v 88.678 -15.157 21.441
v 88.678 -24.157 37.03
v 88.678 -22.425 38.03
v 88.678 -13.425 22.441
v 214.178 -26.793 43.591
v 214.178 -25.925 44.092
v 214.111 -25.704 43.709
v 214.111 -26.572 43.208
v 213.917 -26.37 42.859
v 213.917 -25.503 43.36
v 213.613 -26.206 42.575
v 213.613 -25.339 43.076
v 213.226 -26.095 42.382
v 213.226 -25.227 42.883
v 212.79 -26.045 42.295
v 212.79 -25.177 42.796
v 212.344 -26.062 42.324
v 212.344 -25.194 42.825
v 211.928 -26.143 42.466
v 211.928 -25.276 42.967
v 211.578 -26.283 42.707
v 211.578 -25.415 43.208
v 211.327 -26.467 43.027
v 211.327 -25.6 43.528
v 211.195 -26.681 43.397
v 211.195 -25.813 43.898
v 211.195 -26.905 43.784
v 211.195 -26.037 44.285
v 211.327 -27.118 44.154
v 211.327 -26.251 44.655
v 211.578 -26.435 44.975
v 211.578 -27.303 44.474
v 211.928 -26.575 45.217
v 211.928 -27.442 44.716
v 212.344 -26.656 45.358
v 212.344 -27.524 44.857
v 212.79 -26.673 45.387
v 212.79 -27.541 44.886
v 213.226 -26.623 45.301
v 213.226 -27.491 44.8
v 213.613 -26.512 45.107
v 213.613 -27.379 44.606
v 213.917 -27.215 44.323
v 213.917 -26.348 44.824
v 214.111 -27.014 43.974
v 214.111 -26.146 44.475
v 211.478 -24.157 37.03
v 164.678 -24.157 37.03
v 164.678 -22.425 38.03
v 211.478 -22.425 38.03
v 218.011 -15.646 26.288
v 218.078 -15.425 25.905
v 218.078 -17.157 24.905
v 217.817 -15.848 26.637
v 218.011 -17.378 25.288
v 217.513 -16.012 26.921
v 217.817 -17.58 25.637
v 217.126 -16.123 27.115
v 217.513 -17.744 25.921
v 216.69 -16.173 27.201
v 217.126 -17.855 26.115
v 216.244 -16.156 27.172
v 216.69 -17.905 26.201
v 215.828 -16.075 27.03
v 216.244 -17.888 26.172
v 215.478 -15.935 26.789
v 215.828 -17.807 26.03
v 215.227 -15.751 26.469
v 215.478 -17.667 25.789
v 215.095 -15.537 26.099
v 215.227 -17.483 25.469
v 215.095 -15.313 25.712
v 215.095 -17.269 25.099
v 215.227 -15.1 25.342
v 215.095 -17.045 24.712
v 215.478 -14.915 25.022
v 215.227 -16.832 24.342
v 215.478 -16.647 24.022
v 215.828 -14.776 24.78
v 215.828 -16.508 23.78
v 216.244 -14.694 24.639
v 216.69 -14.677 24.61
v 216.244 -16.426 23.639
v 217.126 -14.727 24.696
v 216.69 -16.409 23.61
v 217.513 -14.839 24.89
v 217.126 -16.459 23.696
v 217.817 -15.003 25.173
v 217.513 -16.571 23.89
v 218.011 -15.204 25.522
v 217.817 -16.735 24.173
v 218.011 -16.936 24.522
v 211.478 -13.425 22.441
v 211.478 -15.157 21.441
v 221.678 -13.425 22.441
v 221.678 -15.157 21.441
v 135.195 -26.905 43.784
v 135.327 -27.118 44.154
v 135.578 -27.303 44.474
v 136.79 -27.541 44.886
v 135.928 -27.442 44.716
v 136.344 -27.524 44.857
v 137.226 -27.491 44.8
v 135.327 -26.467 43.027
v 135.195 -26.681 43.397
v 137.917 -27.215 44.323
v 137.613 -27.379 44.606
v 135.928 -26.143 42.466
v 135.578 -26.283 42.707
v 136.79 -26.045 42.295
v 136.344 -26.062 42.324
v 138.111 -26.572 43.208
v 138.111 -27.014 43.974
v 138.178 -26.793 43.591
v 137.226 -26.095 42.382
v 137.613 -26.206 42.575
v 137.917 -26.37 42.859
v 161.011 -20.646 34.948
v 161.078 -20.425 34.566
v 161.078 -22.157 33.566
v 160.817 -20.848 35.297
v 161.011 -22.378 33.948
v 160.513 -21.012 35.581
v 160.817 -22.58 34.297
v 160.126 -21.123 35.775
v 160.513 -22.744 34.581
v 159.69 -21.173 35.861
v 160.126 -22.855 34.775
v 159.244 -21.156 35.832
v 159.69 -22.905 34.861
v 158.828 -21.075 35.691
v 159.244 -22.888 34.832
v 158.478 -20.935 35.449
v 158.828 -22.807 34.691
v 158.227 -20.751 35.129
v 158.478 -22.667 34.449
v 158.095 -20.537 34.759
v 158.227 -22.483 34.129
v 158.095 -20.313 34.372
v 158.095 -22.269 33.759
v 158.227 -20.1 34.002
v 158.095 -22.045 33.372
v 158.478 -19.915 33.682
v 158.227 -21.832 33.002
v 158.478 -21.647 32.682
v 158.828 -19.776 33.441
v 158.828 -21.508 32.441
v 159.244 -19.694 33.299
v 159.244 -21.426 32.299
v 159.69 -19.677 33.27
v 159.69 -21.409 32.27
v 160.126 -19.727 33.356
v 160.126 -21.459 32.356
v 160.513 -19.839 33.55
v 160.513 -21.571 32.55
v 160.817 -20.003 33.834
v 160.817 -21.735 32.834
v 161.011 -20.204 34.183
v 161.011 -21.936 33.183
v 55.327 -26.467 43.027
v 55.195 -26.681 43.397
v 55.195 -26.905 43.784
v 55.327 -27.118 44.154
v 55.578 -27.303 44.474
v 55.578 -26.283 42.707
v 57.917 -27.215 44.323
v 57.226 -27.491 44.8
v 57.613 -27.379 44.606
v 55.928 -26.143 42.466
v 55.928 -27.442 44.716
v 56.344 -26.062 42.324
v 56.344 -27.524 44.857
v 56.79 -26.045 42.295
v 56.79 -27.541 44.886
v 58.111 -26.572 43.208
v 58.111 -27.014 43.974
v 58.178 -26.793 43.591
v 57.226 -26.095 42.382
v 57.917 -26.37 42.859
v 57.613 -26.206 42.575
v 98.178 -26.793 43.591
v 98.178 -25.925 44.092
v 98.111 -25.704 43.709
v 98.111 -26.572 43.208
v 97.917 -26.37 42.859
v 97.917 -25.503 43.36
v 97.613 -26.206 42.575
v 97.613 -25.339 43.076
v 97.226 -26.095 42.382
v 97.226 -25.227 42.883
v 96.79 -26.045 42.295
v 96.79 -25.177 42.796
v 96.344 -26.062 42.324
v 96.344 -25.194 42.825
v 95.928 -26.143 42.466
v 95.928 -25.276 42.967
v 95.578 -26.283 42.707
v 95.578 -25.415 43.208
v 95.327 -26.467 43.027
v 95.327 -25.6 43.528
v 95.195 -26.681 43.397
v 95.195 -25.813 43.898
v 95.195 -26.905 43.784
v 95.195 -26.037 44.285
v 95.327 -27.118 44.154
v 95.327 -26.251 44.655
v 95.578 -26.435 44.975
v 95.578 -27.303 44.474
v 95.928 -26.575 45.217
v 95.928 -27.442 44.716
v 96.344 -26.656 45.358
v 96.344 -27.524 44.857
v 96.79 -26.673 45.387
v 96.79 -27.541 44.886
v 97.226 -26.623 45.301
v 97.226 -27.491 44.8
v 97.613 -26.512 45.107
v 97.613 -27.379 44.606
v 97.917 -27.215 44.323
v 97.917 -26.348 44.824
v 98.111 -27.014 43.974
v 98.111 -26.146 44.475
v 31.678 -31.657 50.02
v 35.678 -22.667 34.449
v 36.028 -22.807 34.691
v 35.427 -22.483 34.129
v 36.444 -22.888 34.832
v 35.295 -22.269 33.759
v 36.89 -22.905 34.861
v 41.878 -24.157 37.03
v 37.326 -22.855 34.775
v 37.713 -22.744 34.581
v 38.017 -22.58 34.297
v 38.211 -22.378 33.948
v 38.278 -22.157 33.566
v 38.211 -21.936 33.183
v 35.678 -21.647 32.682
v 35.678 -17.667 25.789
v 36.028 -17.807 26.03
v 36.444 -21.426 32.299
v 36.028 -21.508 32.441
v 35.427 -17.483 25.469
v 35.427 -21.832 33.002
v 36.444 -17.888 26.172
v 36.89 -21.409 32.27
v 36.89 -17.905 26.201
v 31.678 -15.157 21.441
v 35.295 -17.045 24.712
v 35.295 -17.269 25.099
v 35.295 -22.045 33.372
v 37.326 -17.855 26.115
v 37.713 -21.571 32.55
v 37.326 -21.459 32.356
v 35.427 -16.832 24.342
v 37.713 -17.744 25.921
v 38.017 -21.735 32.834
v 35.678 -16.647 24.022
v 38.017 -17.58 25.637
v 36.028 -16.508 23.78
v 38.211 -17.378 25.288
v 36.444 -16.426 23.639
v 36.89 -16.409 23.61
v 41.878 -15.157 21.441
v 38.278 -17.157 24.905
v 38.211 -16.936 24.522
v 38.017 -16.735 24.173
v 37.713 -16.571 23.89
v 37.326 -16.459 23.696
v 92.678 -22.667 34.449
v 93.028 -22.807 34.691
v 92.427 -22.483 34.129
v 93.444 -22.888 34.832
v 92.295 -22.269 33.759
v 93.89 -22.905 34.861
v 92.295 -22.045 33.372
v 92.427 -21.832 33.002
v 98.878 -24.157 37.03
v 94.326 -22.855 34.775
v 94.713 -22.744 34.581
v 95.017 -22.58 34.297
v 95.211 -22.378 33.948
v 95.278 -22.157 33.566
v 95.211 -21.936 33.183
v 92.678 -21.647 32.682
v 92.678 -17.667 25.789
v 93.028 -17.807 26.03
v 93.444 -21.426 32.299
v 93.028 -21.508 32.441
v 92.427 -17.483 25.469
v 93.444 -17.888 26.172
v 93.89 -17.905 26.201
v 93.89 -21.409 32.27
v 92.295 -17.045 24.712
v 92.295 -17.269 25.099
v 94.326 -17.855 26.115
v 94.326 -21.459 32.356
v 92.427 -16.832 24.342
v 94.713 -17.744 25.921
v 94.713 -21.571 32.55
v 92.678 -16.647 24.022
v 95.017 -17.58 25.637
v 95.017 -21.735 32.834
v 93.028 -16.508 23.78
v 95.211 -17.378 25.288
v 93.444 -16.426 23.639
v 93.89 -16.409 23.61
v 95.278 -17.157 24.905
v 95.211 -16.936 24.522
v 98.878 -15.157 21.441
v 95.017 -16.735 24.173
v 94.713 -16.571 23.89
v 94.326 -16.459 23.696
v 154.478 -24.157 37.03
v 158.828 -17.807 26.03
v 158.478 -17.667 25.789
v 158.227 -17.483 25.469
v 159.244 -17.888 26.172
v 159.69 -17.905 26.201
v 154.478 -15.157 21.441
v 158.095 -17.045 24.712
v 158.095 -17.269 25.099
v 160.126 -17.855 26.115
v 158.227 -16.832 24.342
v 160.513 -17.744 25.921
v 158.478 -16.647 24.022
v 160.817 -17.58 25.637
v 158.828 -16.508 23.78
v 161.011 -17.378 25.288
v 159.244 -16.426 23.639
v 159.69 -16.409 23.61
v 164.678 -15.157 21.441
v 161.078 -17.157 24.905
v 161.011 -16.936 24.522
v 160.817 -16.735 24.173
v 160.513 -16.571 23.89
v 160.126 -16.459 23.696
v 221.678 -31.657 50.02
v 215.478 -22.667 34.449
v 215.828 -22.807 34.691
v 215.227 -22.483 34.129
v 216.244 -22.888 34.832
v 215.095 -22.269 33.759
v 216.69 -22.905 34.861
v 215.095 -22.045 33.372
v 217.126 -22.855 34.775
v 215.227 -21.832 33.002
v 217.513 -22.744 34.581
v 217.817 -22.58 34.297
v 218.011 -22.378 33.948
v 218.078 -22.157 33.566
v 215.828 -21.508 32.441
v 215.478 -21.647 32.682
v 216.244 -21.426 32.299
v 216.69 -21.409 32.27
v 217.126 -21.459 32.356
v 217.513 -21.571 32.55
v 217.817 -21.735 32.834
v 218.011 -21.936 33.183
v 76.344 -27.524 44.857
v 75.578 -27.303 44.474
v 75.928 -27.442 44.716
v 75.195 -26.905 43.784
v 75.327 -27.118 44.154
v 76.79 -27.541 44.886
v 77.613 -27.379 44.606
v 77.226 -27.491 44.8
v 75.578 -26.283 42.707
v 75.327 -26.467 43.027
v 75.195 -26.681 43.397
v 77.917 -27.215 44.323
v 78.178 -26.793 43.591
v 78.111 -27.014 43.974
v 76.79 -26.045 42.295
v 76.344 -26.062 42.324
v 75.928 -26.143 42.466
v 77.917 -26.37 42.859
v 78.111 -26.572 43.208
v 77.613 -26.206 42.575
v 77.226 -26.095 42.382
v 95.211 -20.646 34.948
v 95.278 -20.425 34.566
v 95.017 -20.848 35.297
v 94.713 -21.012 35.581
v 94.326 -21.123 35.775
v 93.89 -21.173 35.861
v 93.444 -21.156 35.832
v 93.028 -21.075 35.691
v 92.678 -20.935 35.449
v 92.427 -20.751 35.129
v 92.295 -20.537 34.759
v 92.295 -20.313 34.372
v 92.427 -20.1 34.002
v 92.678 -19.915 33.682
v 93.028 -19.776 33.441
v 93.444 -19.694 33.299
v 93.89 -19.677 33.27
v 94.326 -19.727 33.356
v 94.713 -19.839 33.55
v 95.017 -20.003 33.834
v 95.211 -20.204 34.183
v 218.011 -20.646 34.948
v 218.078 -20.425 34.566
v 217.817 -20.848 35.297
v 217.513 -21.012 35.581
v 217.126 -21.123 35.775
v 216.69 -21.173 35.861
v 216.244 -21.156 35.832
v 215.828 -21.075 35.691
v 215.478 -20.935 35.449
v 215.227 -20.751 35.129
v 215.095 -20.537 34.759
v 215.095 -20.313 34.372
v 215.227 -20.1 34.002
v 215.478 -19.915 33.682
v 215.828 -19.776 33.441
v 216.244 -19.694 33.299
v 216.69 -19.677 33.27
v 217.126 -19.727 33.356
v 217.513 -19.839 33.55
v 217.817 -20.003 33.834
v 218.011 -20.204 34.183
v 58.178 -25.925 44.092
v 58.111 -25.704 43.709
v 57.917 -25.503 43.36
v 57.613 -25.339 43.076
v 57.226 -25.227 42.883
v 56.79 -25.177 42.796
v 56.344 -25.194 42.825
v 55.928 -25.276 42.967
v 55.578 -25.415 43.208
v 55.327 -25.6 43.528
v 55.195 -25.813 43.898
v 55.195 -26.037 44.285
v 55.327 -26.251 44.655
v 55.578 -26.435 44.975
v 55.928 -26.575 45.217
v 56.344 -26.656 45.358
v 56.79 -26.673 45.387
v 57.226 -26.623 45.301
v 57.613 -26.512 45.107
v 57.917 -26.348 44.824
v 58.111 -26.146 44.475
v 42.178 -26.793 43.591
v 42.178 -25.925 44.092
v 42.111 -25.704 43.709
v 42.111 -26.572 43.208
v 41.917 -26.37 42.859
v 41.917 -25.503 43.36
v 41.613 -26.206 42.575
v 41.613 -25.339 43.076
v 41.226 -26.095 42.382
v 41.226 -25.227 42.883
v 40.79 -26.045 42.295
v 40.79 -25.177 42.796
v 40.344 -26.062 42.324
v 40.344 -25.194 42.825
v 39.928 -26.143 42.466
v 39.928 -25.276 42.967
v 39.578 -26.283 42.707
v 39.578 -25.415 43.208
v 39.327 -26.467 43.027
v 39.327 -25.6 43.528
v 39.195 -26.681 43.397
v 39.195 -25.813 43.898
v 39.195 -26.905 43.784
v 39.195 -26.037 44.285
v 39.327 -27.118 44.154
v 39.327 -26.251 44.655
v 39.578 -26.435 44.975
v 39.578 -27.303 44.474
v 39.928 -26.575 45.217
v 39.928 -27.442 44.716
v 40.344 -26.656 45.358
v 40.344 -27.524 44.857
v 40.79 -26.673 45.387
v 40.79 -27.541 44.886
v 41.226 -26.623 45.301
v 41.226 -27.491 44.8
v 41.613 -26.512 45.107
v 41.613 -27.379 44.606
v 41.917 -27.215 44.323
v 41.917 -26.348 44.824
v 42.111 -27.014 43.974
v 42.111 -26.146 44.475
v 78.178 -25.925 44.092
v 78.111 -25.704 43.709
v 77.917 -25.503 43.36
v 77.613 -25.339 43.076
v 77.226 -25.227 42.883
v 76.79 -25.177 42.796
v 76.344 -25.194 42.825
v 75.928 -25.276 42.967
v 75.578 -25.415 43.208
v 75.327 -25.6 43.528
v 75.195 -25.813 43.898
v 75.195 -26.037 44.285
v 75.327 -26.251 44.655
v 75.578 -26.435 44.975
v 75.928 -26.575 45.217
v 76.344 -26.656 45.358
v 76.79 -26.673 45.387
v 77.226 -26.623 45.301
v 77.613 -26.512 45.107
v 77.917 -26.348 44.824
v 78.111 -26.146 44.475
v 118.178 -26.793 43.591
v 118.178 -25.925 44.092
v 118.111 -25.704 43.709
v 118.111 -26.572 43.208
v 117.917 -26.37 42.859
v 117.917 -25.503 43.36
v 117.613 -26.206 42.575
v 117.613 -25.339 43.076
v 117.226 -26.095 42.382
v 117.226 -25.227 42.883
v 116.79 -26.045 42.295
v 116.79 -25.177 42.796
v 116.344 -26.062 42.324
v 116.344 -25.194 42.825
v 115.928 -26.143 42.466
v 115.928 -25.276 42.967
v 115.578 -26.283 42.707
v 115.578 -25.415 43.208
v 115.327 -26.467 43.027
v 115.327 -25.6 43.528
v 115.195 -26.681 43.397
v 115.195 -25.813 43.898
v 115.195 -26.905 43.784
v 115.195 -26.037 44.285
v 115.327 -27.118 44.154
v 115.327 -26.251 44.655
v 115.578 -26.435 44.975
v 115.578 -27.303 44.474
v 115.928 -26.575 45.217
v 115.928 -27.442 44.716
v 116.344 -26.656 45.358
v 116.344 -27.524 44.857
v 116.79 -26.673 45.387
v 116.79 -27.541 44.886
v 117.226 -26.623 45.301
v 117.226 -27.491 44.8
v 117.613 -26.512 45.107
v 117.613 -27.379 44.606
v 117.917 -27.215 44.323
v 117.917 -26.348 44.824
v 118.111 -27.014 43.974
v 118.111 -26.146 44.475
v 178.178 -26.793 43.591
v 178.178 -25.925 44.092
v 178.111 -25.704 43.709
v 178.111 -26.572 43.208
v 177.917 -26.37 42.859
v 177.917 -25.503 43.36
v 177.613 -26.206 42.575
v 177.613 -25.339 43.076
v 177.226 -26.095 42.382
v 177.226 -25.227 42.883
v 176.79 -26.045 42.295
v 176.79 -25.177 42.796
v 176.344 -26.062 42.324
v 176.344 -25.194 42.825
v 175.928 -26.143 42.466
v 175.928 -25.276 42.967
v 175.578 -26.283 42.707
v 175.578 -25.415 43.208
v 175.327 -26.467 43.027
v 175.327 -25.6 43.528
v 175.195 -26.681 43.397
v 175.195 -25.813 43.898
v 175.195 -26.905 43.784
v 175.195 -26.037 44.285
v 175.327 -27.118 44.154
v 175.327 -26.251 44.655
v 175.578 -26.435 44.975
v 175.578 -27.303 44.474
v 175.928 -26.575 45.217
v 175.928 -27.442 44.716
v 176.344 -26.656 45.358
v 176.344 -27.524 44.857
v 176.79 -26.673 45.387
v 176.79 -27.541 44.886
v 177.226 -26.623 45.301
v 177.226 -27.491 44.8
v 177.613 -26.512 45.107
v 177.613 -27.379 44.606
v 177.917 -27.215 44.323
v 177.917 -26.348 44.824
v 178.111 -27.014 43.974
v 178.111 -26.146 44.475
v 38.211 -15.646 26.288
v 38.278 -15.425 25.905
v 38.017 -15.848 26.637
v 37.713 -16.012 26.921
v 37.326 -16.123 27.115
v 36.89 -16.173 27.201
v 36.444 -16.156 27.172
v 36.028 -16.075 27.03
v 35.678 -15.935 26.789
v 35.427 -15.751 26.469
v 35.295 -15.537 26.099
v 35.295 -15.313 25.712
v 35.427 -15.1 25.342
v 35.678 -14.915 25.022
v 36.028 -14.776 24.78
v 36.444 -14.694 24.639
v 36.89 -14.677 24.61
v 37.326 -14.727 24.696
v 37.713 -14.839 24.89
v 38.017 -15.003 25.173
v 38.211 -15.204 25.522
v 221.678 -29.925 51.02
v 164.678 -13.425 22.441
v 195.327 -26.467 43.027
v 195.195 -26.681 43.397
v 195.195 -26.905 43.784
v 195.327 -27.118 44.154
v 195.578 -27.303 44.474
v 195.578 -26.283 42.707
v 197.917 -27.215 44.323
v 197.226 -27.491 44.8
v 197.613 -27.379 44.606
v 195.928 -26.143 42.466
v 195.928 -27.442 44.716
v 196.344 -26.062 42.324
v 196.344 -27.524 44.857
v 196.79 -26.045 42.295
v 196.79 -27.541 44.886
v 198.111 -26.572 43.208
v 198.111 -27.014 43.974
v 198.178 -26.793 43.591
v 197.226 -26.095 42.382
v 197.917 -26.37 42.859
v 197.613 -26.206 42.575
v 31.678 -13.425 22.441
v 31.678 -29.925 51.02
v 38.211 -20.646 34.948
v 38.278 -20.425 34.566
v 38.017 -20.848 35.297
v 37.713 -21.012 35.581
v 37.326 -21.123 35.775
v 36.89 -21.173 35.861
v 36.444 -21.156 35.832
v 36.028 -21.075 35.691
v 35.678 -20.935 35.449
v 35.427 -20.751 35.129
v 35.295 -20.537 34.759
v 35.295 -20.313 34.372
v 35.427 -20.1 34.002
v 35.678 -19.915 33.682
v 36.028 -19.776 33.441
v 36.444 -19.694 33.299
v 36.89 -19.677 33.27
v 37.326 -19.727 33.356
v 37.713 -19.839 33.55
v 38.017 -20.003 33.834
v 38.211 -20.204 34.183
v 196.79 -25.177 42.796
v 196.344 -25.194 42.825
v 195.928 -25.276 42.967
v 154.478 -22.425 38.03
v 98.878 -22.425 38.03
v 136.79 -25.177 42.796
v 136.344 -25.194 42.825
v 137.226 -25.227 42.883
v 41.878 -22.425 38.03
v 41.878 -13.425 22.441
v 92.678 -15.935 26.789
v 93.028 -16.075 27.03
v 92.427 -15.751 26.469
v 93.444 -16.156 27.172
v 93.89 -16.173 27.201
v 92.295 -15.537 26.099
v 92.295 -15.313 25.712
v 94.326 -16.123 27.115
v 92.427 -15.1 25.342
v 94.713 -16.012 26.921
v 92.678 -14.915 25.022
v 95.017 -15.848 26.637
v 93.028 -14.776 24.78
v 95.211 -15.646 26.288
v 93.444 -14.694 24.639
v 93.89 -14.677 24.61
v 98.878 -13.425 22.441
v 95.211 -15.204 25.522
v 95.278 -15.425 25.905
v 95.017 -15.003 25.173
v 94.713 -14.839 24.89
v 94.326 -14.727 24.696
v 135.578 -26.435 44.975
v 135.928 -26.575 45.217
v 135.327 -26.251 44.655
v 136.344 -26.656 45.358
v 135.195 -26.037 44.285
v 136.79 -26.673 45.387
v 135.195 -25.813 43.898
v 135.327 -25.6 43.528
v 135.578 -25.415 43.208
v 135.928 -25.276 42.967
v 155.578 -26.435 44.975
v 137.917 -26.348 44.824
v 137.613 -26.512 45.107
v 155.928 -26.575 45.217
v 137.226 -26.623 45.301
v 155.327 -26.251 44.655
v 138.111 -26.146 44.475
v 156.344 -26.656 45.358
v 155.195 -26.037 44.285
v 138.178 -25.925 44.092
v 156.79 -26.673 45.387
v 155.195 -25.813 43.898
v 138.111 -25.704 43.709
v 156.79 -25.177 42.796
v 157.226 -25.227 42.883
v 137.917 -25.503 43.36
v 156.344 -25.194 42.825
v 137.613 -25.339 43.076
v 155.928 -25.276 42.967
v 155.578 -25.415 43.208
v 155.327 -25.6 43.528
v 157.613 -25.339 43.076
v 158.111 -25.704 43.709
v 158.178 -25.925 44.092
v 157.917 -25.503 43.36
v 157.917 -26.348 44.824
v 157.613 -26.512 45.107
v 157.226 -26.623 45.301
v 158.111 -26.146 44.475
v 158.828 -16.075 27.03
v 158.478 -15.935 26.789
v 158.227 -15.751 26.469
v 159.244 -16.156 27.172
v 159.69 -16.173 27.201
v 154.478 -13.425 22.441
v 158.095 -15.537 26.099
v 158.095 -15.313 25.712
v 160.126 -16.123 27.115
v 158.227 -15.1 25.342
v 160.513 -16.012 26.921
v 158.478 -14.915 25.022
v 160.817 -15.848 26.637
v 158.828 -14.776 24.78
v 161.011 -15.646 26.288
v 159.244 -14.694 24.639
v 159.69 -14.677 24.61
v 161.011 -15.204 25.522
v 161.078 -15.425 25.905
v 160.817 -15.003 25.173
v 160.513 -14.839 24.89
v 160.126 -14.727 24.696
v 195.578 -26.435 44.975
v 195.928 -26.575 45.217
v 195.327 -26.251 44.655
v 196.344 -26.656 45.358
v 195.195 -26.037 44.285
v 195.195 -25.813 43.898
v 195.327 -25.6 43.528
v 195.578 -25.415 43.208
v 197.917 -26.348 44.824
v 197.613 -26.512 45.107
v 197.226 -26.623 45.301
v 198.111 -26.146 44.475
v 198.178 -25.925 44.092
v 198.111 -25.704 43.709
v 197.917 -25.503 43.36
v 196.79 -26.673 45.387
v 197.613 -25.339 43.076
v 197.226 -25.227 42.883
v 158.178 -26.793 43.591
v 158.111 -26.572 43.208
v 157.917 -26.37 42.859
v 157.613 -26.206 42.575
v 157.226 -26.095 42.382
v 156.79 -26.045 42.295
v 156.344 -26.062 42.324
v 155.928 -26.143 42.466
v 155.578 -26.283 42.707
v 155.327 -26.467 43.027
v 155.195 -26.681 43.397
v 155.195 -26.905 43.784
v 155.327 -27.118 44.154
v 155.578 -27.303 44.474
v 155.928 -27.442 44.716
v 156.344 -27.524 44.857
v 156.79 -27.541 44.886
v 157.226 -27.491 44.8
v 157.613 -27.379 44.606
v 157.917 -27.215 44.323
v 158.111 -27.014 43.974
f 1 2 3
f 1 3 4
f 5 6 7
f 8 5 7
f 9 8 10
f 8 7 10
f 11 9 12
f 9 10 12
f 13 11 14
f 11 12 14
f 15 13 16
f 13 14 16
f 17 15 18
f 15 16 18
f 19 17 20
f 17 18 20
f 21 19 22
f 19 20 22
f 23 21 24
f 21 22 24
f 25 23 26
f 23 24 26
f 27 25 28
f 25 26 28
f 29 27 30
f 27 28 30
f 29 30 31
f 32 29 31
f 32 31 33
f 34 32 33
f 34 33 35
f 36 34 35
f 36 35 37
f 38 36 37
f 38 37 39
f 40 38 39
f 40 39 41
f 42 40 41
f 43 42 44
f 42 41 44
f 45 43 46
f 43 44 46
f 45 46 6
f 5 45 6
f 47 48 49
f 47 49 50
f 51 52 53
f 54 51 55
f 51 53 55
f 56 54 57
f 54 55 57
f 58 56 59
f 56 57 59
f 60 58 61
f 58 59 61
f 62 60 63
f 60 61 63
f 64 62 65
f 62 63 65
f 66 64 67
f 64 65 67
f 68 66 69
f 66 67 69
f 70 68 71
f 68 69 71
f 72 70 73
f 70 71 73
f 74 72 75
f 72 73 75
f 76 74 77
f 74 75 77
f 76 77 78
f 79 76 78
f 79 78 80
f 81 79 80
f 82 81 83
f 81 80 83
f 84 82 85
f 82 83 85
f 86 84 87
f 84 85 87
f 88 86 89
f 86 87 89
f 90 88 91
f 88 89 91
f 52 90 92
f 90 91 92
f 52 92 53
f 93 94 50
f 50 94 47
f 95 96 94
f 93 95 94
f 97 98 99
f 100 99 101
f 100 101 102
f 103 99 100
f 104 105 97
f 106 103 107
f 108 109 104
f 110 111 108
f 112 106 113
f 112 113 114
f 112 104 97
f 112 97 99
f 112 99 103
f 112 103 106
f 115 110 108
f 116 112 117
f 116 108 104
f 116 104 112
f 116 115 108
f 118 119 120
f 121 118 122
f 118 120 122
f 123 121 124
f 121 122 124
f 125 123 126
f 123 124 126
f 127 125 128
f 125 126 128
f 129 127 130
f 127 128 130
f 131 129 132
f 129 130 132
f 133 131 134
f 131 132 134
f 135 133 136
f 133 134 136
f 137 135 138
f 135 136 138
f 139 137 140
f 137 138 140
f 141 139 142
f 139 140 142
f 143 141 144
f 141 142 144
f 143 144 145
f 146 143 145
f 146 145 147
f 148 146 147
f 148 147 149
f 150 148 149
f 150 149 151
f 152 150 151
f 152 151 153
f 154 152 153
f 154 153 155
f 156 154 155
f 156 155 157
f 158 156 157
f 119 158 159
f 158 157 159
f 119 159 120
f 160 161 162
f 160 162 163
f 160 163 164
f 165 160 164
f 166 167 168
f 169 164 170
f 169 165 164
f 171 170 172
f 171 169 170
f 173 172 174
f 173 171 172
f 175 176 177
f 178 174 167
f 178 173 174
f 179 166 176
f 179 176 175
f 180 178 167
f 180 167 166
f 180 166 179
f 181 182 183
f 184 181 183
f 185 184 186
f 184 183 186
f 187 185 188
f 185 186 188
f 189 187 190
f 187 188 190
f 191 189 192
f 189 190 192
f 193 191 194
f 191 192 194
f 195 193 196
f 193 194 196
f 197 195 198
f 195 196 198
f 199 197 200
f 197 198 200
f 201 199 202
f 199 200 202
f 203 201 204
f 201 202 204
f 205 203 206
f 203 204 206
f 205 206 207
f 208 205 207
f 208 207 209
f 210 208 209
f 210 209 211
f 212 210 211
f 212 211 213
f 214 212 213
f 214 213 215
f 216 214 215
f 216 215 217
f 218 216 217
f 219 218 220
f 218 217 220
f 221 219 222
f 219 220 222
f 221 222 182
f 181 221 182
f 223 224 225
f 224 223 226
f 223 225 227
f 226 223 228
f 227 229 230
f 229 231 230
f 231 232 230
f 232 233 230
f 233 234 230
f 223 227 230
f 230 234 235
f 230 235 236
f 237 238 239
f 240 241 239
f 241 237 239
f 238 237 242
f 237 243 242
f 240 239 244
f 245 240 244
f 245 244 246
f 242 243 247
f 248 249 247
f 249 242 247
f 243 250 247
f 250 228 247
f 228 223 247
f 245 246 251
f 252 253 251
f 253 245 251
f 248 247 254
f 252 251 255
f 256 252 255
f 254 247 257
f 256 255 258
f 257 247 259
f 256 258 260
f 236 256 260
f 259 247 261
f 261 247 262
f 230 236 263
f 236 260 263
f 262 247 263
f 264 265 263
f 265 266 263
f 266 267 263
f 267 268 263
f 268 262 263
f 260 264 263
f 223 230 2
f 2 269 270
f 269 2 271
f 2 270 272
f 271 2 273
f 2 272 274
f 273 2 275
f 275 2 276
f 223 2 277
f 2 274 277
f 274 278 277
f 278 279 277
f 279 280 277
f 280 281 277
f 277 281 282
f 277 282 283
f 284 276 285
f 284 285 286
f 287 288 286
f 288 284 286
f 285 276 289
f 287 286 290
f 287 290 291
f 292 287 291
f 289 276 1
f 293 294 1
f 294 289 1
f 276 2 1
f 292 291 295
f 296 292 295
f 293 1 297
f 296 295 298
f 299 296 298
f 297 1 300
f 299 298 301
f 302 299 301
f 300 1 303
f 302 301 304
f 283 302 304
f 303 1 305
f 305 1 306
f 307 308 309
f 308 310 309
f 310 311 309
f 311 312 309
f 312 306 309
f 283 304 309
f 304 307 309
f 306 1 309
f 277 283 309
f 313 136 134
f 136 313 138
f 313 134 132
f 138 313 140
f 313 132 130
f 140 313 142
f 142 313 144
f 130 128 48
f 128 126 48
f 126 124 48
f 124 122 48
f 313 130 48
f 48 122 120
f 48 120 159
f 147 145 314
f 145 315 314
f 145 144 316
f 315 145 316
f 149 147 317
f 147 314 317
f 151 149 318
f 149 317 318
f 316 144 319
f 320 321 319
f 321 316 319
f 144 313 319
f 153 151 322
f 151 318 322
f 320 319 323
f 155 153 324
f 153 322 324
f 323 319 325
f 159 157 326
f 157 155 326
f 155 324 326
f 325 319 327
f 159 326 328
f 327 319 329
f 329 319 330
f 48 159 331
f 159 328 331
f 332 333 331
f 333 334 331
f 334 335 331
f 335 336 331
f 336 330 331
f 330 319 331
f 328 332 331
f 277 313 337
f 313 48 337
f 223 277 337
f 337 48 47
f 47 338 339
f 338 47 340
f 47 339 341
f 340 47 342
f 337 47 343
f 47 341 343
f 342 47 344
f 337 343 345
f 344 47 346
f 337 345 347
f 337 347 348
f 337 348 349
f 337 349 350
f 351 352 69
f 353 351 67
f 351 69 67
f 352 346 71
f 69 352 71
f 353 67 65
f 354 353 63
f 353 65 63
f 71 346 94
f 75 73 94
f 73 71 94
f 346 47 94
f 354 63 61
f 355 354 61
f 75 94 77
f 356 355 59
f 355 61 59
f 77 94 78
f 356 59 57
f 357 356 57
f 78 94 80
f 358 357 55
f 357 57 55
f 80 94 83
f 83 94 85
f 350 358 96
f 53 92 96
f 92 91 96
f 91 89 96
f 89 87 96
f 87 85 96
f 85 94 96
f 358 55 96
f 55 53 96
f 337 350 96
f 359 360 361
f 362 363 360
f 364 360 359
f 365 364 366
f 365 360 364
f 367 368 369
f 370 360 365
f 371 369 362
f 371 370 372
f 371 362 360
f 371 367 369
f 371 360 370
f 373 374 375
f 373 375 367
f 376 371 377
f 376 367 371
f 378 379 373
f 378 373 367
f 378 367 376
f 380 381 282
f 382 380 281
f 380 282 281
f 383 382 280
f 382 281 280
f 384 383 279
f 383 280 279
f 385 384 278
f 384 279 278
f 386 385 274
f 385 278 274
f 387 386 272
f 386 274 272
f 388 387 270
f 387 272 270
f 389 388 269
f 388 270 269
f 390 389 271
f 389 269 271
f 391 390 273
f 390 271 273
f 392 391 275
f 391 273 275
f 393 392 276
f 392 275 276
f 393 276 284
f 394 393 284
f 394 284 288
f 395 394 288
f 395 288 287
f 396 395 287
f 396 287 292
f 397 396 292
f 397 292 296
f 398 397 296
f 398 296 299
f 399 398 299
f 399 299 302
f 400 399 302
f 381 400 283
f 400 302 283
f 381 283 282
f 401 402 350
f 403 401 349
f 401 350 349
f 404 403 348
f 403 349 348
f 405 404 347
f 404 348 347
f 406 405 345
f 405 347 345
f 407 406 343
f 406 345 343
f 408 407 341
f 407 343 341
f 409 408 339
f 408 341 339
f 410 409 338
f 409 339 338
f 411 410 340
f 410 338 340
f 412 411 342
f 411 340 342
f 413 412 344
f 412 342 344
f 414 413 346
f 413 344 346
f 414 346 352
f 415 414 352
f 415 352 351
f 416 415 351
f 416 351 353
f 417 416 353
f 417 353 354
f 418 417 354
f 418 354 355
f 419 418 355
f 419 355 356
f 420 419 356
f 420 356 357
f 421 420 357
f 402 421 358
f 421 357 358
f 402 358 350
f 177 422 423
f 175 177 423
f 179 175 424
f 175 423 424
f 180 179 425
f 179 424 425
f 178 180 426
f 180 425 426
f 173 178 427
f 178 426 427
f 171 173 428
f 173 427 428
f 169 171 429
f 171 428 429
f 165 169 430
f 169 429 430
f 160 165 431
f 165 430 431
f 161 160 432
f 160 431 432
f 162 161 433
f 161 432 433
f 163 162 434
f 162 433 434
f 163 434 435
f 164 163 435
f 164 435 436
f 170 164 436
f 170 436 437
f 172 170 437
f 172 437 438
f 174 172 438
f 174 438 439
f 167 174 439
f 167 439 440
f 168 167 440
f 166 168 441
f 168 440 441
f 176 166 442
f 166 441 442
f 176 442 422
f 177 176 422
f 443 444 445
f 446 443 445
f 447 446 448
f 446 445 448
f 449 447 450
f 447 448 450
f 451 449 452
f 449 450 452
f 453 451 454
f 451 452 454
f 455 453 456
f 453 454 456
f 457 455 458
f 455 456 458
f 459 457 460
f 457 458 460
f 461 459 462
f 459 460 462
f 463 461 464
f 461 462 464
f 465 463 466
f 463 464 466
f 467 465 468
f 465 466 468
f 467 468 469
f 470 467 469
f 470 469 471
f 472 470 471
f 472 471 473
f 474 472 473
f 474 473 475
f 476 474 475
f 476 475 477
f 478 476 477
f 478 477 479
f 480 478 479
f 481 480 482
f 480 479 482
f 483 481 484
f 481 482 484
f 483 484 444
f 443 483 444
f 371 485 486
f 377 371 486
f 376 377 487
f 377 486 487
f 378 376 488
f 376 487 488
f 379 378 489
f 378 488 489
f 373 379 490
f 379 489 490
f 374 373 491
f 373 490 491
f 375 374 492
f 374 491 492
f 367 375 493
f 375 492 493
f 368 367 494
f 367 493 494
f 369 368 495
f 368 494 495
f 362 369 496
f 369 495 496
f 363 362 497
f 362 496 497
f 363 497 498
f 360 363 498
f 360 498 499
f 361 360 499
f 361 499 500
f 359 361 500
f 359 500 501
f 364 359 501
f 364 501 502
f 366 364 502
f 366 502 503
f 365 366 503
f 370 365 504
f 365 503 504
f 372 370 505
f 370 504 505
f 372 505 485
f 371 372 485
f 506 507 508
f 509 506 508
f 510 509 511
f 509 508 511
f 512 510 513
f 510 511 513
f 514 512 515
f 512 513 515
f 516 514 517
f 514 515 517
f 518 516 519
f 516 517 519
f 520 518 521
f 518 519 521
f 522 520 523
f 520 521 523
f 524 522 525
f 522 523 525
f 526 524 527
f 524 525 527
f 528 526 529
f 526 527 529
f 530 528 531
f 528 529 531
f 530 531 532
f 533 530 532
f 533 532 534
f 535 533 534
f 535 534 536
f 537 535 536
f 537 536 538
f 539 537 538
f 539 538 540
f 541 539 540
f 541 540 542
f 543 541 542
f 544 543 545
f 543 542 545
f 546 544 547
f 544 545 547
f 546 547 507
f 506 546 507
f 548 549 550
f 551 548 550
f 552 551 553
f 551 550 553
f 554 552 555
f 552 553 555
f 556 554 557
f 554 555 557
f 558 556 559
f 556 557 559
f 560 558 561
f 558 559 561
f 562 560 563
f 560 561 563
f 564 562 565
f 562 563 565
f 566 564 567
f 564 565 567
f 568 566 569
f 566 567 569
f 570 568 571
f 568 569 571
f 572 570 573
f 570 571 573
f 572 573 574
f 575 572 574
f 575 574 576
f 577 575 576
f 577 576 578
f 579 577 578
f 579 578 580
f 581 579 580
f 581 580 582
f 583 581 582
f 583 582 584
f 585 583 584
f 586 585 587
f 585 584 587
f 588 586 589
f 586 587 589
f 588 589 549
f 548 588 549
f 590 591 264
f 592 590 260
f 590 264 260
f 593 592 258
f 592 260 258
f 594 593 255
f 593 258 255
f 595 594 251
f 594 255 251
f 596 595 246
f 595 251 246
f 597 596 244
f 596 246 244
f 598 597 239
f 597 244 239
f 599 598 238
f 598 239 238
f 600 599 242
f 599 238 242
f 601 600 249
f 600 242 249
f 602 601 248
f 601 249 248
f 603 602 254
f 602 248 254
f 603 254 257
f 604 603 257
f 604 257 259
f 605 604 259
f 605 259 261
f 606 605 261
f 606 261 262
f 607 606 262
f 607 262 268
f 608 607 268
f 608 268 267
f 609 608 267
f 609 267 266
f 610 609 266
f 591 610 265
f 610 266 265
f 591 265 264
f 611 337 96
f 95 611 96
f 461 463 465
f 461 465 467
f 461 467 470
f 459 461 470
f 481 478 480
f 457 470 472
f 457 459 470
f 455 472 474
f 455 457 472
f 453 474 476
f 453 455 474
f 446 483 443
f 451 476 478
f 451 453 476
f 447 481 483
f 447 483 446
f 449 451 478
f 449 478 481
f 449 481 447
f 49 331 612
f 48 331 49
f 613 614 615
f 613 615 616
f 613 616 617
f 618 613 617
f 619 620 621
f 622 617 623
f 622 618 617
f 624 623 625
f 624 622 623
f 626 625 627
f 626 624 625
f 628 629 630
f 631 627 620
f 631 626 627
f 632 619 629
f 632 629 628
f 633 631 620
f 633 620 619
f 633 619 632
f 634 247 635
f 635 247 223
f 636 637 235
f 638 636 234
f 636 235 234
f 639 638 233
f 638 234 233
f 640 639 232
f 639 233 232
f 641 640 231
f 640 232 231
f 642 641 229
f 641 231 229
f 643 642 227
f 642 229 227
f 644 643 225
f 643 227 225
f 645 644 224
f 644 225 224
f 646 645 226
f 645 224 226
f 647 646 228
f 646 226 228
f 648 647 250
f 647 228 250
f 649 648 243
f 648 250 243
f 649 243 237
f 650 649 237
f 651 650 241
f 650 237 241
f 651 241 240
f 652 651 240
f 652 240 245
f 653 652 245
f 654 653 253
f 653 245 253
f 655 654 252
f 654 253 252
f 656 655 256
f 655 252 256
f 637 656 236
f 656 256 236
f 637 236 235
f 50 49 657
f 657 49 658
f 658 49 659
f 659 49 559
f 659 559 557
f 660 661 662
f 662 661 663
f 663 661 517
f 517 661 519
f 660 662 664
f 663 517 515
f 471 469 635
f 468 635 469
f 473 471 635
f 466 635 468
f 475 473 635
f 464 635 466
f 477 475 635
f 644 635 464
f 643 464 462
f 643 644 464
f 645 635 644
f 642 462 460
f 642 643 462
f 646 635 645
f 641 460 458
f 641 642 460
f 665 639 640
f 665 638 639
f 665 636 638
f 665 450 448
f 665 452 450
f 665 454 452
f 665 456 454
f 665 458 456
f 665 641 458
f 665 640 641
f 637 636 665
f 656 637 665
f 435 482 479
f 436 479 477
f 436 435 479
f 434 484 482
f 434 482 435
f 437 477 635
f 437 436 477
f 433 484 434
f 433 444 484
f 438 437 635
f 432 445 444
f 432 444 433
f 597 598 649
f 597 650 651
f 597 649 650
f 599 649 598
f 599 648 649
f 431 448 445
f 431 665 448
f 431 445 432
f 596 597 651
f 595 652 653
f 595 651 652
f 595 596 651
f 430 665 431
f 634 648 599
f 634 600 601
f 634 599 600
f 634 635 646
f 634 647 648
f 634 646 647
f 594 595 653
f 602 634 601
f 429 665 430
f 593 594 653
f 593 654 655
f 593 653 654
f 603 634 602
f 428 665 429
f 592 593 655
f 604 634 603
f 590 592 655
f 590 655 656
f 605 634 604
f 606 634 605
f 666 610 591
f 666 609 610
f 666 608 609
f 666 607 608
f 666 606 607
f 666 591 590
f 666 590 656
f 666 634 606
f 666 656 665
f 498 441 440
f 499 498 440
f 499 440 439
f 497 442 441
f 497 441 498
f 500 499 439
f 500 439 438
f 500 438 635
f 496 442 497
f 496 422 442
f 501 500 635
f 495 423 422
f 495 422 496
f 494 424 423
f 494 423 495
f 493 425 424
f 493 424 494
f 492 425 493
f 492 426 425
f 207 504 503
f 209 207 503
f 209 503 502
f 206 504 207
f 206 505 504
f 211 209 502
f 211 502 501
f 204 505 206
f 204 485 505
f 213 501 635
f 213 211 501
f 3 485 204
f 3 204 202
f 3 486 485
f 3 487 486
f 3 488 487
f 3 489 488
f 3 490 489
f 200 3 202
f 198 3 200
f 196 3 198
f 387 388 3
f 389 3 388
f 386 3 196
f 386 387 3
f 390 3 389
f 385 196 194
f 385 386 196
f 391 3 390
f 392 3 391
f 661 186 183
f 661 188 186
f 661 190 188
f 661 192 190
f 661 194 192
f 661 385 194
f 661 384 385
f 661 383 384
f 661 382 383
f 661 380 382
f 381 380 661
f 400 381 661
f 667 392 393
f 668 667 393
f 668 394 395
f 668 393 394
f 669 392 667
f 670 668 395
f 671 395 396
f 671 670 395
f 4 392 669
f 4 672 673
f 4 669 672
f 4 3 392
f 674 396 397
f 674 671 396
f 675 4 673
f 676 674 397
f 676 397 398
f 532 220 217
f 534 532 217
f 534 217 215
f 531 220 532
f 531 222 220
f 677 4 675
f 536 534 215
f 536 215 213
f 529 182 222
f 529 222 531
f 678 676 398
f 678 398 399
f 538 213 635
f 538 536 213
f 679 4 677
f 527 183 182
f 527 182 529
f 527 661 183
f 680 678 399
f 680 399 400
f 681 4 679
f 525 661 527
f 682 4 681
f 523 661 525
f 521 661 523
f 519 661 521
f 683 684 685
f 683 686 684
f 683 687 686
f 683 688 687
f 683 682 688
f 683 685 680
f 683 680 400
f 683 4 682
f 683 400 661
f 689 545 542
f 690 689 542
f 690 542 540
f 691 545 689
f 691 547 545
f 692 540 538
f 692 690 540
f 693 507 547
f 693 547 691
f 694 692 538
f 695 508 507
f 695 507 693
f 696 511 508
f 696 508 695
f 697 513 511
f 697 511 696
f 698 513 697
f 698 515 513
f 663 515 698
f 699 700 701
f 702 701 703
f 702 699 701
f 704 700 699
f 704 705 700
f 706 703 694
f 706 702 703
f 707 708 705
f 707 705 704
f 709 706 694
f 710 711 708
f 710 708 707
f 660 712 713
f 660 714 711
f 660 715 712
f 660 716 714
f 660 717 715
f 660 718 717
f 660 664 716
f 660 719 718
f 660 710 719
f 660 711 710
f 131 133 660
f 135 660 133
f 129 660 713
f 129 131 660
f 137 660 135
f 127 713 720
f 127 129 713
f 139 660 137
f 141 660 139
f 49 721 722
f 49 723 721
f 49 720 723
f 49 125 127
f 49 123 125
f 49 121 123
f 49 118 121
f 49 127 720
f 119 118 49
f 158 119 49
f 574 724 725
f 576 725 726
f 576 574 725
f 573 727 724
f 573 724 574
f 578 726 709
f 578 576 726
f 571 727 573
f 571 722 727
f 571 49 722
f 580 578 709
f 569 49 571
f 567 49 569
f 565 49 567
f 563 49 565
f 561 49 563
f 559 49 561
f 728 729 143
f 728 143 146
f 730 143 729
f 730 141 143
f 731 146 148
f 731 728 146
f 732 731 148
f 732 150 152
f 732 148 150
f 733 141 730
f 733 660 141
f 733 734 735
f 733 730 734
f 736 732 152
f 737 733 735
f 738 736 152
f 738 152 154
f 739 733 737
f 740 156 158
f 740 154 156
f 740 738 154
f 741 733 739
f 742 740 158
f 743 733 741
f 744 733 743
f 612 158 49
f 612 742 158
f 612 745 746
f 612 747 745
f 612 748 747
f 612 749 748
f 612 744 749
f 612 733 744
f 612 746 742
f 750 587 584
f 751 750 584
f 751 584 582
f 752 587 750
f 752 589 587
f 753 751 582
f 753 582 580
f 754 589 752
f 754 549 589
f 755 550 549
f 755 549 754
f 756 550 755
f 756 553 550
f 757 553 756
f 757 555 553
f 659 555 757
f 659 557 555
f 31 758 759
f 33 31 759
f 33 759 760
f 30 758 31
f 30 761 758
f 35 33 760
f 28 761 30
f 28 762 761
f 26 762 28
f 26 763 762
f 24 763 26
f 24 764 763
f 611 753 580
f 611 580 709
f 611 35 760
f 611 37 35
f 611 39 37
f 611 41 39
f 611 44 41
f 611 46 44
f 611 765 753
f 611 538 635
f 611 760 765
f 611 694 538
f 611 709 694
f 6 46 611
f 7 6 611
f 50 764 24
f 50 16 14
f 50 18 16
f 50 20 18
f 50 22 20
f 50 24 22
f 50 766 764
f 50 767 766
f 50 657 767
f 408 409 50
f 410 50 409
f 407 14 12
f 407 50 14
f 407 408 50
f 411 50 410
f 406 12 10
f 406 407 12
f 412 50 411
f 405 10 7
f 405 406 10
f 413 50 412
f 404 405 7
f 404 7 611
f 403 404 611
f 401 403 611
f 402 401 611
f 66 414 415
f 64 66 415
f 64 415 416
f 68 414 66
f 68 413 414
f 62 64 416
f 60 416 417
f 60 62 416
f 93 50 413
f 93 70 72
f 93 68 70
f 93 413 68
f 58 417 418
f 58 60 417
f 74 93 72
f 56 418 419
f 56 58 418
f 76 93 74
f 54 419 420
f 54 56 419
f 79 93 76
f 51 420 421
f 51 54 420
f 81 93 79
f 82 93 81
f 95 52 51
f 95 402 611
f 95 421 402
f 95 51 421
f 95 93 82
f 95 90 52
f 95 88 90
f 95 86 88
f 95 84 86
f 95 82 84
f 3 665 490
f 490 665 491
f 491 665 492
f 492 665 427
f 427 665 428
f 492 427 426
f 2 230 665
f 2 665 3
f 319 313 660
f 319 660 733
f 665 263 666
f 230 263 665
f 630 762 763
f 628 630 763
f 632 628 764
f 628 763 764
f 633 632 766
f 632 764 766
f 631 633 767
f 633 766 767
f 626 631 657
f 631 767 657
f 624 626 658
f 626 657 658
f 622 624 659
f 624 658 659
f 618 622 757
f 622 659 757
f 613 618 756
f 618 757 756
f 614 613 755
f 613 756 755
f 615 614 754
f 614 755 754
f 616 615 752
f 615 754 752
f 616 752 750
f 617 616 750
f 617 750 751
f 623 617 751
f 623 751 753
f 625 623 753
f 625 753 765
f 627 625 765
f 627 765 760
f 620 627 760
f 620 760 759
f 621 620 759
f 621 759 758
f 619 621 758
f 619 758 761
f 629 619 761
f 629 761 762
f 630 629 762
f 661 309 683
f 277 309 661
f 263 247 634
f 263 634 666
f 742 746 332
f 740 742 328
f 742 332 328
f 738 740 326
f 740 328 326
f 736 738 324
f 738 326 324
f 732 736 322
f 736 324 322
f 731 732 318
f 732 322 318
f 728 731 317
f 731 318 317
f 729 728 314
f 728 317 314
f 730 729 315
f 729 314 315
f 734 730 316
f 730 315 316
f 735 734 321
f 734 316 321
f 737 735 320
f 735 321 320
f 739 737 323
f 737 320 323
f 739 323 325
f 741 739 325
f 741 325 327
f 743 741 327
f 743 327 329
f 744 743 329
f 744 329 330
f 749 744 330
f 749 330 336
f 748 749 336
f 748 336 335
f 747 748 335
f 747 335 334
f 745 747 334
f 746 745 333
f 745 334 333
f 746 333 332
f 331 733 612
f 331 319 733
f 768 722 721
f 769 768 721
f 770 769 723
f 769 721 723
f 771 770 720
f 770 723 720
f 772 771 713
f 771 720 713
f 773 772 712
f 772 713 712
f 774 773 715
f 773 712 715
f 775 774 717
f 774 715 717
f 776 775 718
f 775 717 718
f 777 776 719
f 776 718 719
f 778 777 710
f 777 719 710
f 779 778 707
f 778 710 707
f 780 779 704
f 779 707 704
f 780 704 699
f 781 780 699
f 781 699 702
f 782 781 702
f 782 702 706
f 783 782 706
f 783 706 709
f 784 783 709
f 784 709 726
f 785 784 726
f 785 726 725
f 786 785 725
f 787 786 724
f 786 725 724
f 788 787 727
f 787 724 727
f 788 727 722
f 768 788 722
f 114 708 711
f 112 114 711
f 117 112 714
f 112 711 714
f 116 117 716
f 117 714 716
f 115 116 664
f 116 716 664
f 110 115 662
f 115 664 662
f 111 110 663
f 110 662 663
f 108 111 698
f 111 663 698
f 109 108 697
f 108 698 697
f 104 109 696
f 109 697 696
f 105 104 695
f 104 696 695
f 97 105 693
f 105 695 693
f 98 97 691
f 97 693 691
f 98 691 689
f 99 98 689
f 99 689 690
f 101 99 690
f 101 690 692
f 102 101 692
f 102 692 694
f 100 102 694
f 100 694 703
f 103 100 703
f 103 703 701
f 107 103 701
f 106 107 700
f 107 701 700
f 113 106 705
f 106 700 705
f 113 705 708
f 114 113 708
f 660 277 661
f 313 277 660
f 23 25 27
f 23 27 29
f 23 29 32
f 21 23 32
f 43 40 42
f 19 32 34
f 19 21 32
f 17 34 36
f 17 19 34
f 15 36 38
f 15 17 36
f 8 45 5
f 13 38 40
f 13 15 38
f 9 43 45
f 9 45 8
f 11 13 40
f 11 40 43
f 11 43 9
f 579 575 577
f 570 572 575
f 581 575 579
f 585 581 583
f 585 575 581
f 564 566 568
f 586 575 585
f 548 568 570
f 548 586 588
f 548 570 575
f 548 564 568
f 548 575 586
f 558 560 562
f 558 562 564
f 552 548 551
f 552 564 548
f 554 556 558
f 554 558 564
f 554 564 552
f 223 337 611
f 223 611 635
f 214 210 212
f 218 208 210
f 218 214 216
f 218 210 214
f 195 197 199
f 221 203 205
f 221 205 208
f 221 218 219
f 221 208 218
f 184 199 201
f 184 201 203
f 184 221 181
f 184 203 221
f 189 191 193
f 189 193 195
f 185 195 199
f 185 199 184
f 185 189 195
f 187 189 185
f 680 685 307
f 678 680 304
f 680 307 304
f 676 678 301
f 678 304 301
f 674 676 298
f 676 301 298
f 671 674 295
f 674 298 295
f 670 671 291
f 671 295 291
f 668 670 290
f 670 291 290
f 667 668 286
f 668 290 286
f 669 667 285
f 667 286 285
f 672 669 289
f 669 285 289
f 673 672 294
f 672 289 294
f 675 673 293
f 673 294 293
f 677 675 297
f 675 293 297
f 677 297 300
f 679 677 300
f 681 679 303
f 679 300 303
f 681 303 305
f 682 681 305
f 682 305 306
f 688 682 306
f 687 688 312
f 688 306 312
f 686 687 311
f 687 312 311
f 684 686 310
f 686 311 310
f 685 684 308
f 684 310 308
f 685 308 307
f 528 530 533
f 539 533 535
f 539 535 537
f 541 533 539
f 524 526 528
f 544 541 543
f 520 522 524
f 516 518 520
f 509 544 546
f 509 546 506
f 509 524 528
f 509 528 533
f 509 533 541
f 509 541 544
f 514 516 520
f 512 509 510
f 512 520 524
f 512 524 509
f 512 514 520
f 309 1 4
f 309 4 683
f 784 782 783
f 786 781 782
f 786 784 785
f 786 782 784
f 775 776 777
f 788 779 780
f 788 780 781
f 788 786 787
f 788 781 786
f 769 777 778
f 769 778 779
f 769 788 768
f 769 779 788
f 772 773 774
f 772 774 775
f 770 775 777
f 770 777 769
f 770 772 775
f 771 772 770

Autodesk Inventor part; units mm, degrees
ref_plane "YZ Plane" through (0, 0, 0) normal (1, 0, 0) x (0, 1, 0)
ref_plane "XZ Plane" through (0, 0, 0) normal (0, 1, 0) x (-1, 0, 0)
ref_plane "작업 평면1" through (126.678, -21.6572, 32.6995) normal (0, 0.8660254, 0.5) x (1, 0, 0)
sketch "스케치1" plane through (126.678, -21.6572, 32.6995) normal (0, 0.8660254, 0.5) x (1, 0, 0)
  circle A0 centre (89.9, 9) radius 1.5 projected
  circle A1 centre (-89.9, -1) radius 1.5 projected
  circle A2 centre (-89.9, 9) radius 1.5 projected
  circle A3 centre (89.9, -1) radius 1.5 projected
  circle A4 centre (32.9, 9) radius 1.5 projected
  circle A5 centre (-32.9, -1) radius 1.5 projected
  circle A6 centre (-32.9, 9) radius 1.5 projected
  circle A7 centre (32.9, -1) radius 1.5 projected
  line L0 (95, -17) -> (95, 17) projected
  line L1 (8, 17) -> (95, 17) projected
  line L2 (8, 17) -> (8, 10) projected
  arc A8 (6, 8) -> (8, 10) centre (6, 10) ccw projected
  line L3 (6, 8) -> (-6, 8) projected
  arc A9 (-8, 10) -> (-6, 8) centre (-6, 10) ccw projected
  line L4 (-8, 10) -> (-8, 17) projected
  line L5 (-95, 17) -> (-8, 17) projected
  line L6 (-95, 17) -> (-95, -17) projected
  line L7 (95, -17) -> (-95, -17) projected
  line L8 (95, 13) -> (95, -20)
  line L9 (95, -20) -> (-95, -20)
  line L10 (-95, -20) -> (-95, 13)
  line L11 (-95, 13) -> (-84.8, 13)
  line L12 (-84.8, 13) -> (-84.8, -5)
  line L13 (-84.8, -5) -> (-95, -5)
  line L14 (-95, -5) -> (-95, 13)
  line L15 (-38, 13) -> (-27.8, 13)
  line L16 (-27.8, 13) -> (-27.8, -5)
  line L17 (-27.8, -5) -> (-38, -5)
  line L18 (-38, -5) -> (-38, 13)
  line L19 (27.8, 13) -> (38, 13)
  line L20 (38, 13) -> (38, -5)
  line L21 (38, -5) -> (27.8, -5)
  line L22 (27.8, -5) -> (27.8, 13)
  line L23 (95, 13) -> (84.8, 13)
  line L24 (84.8, 13) -> (84.8, -5)
  line L25 (84.8, -5) -> (95, -5)
  line L26 (95, -5) -> (95, 13)
  line L27 (-84.8, -5) -> (84.8, -5)
  line L28 (84.8, 13) -> (95, 13)
  line L29 (27.8, 13) -> (38, 13)
  line L30 (-95, 13) -> (-84.8, 13)
  line L31 (-38, 13) -> (-27.8, 13)
  point P0 (-126.678, 39.1472)
  dimension "d1" = 190
  dimension "d2" = 33
  dimension "d5" = 10.2
  dimension "d6" = 18
  dimension "d7" = 10.2
  dimension "d8" = 18
  dimension "d9" = 10.2
  dimension "d10" = 18
  dimension "d11" = 5.1
  dimension "d12" = 18
  dimension "d13" = 10.2
  dimension "d14" = 5.1
extrude "돌출1" add sketch "스케치1" along normal blind 2 contours L7 L6 L13 L27 L17 L21 L25 L0 | L8 L9 L10 L7 | L25 L24 L23 L0 | L6 L11 L12 L13 | L21 L22 L19 L20 | L18 L15 L16 L17
sketch "스케치2" plane through (126.678, -19.9251, 33.6995) normal (0, 0.8660254, 0.5) x (1, 0, 0)
  circle A0 centre (32.9, 9) radius 1.5 projected
  circle A1 centre (32.9, -1) radius 1.5 projected
  circle A2 centre (-89.9, 9) radius 1.5 projected
  circle A3 centre (-89.9, -1) radius 1.5 projected
  circle A4 centre (89.9, 9) radius 1.5 projected
  circle A5 centre (89.9, -1) radius 1.5 projected
  circle A6 centre (-32.9, 9) radius 1.5 projected
  circle A7 centre (-32.9, -1) radius 1.5 projected
  line L0 (-38, 13) -> (-38, -5) projected
  line L1 (-38, -5) -> (-84.8, -5) projected
  line L2 (-84.8, -5) -> (-84.8, 13) projected
  line L3 (-84.8, 13) -> (-95, 13) projected
  line L4 (-95, 13) -> (-95, -20) projected
  line L5 (-95, -20) -> (95, -20) projected
  line L6 (95, -20) -> (95, 13) projected
  line L7 (95, 13) -> (84.8, 13) projected
  line L8 (84.8, 13) -> (84.8, -5) projected
  line L9 (84.8, -5) -> (38, -5) projected
  line L10 (38, -5) -> (38, 13) projected
  line L11 (38, 13) -> (27.8, 13) projected
  line L12 (27.8, 13) -> (27.8, -5) projected
  line L13 (27.8, -5) -> (-27.8, -5) projected
  line L14 (-27.8, -5) -> (-27.8, 13) projected
  line L15 (-27.8, 13) -> (-38, 13) projected
  line L16 (-95, -20) -> (95, -20) projected
  line L17 (-86, -20) -> (-86, -12)
  line L18 (-86, -12) -> (-70, -12)
  line L19 (-70, -12) -> (-50, -12)
  line L20 (-50, -12) -> (-30, -12)
  line L21 (-30, -12) -> (-10, -12)
  line L22 (-10, -12) -> (10, -12)
  line L23 (10, -12) -> (30, -12)
  line L24 (30, -12) -> (50, -12)
  line L25 (50, -12) -> (70, -12)
  line L26 (70, -12) -> (86, -12)
  circle A8 centre (-86, -12) radius 1.5
  circle A9 centre (-70, -12) radius 1.5
  circle A10 centre (-50, -12) radius 1.5
  circle A11 centre (-30, -12) radius 1.5
  circle A12 centre (-10, -12) radius 1.5
  circle A13 centre (10, -12) radius 1.5
  circle A14 centre (30, -12) radius 1.5
  circle A15 centre (50, -12) radius 1.5
  circle A16 centre (70, -12) radius 1.5
  circle A17 centre (86, -12) radius 1.5
  point P0 (-126.678, 39.1472)
  dimension "d17" = 8
  dimension "d18" = 16
  dimension "d19" = 20
  dimension "d20" = 20
  dimension "d21" = 20
  dimension "d22" = 20
  dimension "d23" = 20
  dimension "d24" = 20
  dimension "d25" = 20
  dimension "d26" = 16
  dimension "d27" = 9
  dimension "d28" = 3
  dimension "d29" = 3
  dimension "d30" = 3
  dimension "d31" = 3
  dimension "d32" = 3
  dimension "d33" = 3
  dimension "d34" = 3
  dimension "d35" = 3
  dimension "d36" = 3
  dimension "d38" = 3
extrude "돌출2" cut sketch "스케치2" against normal blind 1 contours A8 L18 L17 | L17 L18 A8 | A9 L19 L18 | L18 L19 A9 | A10 L20 L19 | L19 L20 A10 | A11 L21 L20 | L20 L21 A11 | A12 L22 L21 | L21 L22 A12 | A13 L23 L22 | L22 L23 A13 | A14 L24 L23 | L23 L24 A14 | A15 L25 L24 | L24 L25 A15 | A16 L26 L25 | L25 L26 A16 | A17
properties part number "칼팁" material "철, 주조"
